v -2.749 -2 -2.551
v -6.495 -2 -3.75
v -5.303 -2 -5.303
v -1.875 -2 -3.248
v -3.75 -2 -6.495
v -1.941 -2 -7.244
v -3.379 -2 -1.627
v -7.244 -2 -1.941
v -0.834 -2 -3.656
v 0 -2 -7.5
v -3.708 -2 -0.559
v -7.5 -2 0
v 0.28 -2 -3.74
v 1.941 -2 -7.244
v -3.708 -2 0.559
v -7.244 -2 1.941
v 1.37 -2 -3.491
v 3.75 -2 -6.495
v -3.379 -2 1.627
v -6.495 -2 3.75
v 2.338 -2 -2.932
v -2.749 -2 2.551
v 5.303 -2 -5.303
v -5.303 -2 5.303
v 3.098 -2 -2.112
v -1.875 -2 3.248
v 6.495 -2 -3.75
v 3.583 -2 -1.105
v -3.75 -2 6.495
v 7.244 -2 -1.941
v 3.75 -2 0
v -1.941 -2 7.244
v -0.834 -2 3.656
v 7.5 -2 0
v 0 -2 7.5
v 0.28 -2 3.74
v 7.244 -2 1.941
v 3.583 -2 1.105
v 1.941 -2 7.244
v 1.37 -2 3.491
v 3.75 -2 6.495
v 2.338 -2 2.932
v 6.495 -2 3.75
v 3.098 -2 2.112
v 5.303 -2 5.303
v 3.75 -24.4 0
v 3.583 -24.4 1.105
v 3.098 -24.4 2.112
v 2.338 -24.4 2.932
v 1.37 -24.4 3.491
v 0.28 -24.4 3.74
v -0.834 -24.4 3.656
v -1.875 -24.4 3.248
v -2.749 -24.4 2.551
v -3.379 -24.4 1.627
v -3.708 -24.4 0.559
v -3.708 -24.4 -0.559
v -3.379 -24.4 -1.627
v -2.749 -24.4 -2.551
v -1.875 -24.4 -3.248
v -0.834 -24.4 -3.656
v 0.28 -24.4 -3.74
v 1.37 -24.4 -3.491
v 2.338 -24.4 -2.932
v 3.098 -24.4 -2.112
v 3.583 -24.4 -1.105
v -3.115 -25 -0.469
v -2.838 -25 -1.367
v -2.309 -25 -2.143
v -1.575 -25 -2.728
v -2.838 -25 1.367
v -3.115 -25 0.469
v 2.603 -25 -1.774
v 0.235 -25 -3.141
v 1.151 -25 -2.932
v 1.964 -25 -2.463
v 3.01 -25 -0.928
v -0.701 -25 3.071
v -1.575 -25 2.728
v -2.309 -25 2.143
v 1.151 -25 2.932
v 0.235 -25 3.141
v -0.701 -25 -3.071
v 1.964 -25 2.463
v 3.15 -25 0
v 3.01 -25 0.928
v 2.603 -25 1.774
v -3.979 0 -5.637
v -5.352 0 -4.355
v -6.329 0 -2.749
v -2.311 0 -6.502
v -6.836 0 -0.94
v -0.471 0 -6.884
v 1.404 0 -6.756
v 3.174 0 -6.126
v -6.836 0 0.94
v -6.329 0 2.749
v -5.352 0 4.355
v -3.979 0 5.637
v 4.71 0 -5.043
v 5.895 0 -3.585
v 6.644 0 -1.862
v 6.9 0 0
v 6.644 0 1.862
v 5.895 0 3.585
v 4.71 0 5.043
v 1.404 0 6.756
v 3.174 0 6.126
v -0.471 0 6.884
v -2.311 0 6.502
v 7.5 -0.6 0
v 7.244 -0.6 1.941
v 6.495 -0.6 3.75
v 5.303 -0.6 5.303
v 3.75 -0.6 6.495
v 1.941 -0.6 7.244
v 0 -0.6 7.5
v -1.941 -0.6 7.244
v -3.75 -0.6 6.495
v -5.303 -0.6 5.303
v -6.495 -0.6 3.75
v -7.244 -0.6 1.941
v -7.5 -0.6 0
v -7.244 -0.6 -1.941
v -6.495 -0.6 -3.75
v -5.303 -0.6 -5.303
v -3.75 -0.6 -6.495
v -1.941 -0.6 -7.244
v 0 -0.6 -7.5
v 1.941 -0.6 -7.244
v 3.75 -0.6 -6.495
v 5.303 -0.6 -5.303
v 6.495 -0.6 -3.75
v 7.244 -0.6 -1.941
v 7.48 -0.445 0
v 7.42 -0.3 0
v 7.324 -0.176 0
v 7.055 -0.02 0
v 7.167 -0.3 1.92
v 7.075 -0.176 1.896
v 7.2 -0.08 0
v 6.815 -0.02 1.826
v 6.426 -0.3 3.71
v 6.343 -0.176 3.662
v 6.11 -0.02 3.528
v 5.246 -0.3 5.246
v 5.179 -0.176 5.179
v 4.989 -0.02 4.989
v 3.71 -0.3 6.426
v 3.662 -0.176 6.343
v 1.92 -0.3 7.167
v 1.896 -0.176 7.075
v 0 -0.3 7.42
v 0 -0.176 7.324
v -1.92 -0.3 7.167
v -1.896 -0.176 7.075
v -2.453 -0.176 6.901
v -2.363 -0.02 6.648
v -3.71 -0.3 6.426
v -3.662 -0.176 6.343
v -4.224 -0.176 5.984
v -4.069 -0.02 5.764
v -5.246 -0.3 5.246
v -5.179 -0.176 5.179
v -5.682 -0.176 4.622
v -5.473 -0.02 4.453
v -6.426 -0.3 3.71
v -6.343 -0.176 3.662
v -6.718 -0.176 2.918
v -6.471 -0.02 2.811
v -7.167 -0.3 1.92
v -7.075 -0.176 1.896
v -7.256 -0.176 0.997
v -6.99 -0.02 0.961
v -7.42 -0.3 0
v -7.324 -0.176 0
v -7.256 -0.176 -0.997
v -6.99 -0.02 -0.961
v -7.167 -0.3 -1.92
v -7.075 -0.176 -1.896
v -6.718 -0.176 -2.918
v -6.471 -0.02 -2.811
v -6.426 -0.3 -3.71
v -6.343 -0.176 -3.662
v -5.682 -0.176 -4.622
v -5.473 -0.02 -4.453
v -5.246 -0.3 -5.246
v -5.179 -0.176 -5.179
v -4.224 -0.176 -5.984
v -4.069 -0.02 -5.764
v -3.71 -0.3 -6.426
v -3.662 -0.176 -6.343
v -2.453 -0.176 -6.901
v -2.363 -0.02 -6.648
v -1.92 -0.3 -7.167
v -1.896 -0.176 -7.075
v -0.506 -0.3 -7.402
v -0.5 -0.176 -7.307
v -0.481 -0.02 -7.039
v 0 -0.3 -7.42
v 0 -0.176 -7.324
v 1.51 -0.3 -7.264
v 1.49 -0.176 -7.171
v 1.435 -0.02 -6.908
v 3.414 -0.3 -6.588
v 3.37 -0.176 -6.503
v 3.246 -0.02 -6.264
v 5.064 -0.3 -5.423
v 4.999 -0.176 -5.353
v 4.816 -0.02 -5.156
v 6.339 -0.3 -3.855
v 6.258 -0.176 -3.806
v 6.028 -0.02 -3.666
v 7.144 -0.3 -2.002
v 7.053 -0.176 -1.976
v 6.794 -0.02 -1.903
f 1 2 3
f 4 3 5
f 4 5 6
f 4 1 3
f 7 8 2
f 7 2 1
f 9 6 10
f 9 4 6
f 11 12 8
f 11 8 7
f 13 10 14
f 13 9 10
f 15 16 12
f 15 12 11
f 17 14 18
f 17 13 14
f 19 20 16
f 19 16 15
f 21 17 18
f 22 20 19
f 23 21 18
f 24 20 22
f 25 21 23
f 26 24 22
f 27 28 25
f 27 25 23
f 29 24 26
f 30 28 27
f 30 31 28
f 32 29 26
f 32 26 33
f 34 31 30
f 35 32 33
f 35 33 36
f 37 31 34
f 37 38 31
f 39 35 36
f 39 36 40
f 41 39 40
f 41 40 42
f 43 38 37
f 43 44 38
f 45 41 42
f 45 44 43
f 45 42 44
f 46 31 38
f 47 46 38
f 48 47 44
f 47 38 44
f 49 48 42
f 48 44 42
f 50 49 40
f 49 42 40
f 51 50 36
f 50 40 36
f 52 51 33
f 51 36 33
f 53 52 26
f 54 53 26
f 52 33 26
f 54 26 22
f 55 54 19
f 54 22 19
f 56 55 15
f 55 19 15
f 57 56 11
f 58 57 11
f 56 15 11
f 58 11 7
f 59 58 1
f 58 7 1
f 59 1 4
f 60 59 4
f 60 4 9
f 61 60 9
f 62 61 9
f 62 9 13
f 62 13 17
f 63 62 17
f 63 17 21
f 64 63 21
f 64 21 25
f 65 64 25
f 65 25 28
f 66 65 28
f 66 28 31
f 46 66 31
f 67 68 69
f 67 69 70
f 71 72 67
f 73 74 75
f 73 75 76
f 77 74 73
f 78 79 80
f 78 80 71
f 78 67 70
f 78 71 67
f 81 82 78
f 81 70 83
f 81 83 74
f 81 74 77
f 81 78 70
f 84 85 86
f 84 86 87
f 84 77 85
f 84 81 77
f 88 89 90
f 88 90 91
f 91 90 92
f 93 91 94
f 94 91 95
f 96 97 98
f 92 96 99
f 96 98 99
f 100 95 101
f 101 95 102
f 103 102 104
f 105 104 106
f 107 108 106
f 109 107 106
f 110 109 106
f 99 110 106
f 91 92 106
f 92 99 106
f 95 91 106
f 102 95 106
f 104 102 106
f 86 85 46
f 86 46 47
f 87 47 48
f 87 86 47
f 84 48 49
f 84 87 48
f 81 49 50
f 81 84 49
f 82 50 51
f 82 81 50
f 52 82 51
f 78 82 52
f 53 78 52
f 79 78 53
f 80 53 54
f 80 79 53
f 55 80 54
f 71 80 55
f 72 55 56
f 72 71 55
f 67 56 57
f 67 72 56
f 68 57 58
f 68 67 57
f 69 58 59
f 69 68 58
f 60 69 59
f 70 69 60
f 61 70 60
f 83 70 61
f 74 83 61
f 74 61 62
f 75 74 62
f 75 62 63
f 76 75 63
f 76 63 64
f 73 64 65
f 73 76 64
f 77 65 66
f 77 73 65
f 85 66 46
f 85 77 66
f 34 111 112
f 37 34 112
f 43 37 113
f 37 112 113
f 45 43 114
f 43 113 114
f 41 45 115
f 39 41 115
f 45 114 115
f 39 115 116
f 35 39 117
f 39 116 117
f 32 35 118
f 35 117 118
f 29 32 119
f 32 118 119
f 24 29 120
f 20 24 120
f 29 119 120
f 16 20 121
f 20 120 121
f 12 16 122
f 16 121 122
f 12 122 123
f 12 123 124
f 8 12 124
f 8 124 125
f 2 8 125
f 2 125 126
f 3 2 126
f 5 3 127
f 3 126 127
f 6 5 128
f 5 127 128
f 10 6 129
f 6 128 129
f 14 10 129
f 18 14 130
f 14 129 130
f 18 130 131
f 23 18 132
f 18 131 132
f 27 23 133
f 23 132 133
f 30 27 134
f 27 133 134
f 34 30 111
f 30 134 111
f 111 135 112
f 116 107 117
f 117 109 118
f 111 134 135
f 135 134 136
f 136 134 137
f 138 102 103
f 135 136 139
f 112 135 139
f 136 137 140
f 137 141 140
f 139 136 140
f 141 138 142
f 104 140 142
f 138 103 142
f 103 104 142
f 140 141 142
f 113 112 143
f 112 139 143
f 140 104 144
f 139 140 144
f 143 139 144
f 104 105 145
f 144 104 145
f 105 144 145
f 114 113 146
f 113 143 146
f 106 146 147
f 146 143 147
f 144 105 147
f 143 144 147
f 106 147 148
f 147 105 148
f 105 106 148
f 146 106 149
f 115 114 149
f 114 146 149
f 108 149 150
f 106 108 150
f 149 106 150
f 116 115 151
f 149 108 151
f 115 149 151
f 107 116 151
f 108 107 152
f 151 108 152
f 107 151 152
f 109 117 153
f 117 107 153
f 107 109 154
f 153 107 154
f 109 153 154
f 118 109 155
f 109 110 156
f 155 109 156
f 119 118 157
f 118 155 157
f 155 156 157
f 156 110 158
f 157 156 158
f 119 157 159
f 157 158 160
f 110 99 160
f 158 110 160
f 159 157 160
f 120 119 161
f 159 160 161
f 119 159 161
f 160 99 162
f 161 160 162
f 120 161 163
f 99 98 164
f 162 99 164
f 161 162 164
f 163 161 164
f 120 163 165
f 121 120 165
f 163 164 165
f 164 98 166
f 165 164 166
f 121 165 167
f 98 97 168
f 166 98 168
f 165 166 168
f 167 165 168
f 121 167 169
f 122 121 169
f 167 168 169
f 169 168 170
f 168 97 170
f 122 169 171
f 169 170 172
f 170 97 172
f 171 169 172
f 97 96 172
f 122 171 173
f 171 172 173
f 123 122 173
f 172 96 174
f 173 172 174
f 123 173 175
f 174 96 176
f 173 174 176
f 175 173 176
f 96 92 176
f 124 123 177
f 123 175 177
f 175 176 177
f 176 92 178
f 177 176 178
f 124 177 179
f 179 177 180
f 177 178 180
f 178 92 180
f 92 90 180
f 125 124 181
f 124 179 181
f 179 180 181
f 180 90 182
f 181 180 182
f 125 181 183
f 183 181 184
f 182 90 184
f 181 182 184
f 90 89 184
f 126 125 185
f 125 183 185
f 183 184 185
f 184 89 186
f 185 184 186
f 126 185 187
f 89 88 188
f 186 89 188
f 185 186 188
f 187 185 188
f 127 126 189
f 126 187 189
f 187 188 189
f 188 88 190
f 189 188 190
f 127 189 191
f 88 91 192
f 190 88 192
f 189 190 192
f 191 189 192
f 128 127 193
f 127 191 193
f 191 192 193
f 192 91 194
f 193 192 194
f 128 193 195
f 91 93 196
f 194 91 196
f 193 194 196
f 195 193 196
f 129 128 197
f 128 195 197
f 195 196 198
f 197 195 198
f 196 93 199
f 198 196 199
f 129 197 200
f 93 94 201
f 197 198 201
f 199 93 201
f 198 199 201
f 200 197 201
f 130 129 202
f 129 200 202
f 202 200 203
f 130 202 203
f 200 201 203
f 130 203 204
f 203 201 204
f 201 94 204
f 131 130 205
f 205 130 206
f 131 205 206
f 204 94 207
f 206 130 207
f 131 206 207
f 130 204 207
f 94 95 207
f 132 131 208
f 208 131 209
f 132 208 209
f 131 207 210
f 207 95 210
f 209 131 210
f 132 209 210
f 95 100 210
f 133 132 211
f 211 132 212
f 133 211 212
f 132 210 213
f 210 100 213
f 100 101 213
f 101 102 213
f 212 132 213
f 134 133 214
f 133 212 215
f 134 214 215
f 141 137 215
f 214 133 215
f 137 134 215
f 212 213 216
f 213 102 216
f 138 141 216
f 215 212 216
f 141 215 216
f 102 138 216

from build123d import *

# Parameters (mm, degrees)
F0_R     = 3.75
F1_DEPTH = 25
F2_R     = 7.5
F3_DEPTH = 2
F4_R     = 0.6
F5_SIZE  = 0.6


with BuildPart() as f1:
    # F0 (on Front) → F1 (new body)
    with BuildSketch(Plane.XZ):
        Circle(F0_R)
    extrude(amount=F1_DEPTH)

    # F2 (on Front) → F3 (join)
    with BuildSketch(Plane.XZ):
        Circle(F2_R)
    extrude(amount=F3_DEPTH)

    # F4
    f4_edges = [f1.edges().sort_by_distance(p)[0] for p in [
        (-7.5, 0, 0),
    ]]
    fillet(f4_edges, radius=F4_R)

    # F5
    f5_edges = [f1.edges().sort_by_distance(p)[0] for p in [
        (-3.75, -25, 0),
    ]]
    chamfer(f5_edges, length=F5_SIZE)


solid = f1.part
